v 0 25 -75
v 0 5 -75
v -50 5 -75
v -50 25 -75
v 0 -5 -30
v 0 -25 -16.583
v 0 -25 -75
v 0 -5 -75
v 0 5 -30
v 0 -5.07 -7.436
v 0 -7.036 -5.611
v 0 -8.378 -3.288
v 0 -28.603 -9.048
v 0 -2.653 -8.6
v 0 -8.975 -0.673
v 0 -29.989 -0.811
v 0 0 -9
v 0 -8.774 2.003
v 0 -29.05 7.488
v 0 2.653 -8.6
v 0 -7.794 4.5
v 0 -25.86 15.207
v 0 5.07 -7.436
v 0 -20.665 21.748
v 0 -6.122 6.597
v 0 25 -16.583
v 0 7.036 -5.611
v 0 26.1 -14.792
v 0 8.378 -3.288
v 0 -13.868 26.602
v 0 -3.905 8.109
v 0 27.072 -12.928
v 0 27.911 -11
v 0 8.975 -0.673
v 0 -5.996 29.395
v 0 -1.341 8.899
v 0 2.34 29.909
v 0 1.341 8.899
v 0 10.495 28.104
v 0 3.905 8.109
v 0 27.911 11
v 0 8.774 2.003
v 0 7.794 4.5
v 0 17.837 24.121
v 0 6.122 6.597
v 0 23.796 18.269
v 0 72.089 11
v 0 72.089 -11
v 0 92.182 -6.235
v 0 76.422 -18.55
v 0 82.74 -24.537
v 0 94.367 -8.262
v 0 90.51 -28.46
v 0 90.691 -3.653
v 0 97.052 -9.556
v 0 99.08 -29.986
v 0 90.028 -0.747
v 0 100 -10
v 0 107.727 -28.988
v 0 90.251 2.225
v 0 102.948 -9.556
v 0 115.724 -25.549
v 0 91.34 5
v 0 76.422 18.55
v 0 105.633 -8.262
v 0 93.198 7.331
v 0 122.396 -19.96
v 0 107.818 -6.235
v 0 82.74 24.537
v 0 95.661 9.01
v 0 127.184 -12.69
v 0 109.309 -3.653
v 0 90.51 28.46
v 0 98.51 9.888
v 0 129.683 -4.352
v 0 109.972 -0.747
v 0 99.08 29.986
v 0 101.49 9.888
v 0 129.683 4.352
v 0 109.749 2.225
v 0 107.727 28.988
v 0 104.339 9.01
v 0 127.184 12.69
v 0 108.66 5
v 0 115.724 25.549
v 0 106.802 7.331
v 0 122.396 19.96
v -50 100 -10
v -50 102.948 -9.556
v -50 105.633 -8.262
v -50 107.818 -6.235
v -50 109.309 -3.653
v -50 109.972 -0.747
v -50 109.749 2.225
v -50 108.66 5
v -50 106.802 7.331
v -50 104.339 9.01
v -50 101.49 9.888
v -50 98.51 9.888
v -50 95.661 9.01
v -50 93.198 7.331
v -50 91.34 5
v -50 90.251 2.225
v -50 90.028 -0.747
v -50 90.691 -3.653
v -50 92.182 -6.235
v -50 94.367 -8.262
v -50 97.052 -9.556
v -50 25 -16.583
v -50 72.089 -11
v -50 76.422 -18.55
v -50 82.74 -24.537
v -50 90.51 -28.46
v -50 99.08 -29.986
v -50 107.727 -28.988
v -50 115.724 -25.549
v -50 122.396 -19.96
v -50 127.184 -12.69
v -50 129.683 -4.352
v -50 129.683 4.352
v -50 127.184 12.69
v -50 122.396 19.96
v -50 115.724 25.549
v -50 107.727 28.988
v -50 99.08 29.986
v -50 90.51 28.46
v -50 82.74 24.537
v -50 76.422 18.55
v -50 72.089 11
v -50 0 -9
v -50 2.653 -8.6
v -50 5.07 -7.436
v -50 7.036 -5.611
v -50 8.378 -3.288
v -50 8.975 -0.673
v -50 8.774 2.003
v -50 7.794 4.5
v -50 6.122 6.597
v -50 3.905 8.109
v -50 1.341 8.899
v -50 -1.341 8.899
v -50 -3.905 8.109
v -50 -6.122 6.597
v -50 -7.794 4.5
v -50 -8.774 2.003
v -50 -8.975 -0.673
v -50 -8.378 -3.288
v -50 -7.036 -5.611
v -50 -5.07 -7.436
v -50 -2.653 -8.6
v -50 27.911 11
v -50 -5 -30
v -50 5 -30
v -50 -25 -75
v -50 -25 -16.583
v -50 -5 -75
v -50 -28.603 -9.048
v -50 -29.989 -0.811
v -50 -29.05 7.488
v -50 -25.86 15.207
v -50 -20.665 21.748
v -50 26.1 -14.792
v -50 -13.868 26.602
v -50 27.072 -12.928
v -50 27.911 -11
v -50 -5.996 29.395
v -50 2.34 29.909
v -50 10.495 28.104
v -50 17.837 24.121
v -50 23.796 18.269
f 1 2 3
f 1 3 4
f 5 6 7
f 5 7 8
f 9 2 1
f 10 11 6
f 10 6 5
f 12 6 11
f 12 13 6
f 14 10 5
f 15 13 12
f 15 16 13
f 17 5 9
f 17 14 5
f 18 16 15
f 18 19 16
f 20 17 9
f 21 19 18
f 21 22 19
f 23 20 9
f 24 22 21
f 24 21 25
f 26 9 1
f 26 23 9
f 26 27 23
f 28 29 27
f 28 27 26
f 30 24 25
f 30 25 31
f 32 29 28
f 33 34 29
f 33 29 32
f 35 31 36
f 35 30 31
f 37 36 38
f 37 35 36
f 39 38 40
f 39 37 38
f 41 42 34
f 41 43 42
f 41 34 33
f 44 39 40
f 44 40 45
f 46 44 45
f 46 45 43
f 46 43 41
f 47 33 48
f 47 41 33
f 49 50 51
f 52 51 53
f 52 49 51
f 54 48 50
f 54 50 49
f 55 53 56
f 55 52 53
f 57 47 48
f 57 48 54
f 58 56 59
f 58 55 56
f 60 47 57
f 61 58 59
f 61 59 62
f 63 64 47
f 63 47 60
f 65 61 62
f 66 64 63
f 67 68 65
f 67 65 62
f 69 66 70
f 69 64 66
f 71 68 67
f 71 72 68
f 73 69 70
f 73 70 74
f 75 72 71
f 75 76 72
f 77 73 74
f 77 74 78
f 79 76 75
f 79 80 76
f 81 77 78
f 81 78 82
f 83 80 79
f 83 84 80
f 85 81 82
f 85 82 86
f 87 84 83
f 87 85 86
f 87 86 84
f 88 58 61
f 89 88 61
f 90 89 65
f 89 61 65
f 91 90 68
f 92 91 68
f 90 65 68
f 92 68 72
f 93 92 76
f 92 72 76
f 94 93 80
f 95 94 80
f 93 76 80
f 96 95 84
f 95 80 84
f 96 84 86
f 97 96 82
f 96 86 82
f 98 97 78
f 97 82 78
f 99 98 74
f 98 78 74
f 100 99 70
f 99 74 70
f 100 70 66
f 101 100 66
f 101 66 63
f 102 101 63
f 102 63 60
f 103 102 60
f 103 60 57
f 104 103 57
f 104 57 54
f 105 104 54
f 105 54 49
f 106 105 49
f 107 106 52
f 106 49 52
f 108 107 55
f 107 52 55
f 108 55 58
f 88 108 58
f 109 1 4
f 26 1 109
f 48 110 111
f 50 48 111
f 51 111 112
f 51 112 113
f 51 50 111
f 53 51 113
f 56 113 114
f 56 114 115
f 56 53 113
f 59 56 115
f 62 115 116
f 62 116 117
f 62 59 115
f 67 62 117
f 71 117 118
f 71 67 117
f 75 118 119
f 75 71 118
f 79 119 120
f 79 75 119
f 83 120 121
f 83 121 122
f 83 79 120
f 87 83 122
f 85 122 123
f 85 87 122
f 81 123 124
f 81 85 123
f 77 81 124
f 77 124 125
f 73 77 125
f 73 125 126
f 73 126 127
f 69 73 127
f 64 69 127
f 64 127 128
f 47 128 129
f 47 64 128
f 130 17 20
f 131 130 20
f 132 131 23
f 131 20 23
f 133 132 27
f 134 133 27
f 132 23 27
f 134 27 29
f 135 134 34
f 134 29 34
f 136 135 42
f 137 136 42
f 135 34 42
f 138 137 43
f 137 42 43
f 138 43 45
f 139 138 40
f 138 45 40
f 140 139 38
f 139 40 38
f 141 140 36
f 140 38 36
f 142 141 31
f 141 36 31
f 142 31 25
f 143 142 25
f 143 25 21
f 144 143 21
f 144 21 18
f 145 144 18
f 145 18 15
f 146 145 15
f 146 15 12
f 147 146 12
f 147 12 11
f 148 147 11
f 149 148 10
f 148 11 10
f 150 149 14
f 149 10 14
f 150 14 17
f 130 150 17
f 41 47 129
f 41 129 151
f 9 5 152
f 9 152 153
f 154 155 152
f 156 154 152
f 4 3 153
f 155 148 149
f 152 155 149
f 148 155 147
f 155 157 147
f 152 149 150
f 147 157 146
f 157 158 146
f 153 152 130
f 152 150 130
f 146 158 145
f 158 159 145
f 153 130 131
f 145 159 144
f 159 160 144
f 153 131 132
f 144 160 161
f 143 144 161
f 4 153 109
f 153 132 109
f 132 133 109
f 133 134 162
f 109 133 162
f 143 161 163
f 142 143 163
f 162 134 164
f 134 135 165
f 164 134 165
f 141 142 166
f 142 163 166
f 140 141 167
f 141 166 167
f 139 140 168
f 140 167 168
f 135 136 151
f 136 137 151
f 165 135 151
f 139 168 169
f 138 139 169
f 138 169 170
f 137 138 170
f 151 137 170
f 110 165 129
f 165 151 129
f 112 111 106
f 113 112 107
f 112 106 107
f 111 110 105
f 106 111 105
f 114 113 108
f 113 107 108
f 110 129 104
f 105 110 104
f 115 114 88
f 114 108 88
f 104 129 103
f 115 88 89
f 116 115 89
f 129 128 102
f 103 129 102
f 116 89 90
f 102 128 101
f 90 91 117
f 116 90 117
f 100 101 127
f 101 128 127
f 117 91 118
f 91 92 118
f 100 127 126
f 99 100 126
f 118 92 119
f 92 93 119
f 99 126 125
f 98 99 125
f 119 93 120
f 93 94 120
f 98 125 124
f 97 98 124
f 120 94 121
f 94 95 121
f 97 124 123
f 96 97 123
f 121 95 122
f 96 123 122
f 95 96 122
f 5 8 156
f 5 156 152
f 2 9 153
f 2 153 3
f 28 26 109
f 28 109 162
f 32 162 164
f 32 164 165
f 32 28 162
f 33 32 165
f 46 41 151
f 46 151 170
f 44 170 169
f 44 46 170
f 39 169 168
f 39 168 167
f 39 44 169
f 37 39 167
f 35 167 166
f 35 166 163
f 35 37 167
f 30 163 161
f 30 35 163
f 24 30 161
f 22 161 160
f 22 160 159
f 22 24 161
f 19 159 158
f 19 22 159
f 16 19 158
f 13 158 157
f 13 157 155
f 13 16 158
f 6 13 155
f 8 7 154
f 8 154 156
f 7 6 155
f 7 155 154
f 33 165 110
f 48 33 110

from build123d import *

# Parameters (mm, degrees)
SKETCH1_R           = 9
SKETCH1_R_2         = 10
BOSS_EXTRUDE1_DEPTH = 50


with BuildPart() as part:
    # Sketch1 → Boss-Extrude1 (new body)
    with BuildSketch(Plane.YZ):
        with BuildLine():
            Line((-25, -16.583123952), (-25, -75))
            Line((-25, -75), (-5, -75))
            Line((-5, -75), (-5, -30))
            Line((-5, -30), (5, -30))
            Line((5, -30), (5, -75))
            Line((5, -75), (25, -75))
            Line((25, -75), (25, -16.583123952))
            ThreePointArc((25, -16.583123952), (26.602160846, -13.868130311), (27.910571474, -11))
            Line((27.910571474, -11), (72.089428526, -11))
            ThreePointArc((72.089428526, -11), (130, 0), (72.089428526, 11))
            Line((72.089428526, 11), (27.910571474, 11))
            ThreePointArc((27.910571474, 11), (-13.868130311, 26.602160846), (-25, -16.583123952))
        make_face()
        with Locations(Location((0, 0, 0), (0, 0, 270))):
            Circle(SKETCH1_R, mode=Mode.SUBTRACT)
        with Locations(Location((100, 0, 0), (0, 0, 270))):
            Circle(SKETCH1_R_2, mode=Mode.SUBTRACT)
    extrude(amount=-BOSS_EXTRUDE1_DEPTH)


solid = part.part
